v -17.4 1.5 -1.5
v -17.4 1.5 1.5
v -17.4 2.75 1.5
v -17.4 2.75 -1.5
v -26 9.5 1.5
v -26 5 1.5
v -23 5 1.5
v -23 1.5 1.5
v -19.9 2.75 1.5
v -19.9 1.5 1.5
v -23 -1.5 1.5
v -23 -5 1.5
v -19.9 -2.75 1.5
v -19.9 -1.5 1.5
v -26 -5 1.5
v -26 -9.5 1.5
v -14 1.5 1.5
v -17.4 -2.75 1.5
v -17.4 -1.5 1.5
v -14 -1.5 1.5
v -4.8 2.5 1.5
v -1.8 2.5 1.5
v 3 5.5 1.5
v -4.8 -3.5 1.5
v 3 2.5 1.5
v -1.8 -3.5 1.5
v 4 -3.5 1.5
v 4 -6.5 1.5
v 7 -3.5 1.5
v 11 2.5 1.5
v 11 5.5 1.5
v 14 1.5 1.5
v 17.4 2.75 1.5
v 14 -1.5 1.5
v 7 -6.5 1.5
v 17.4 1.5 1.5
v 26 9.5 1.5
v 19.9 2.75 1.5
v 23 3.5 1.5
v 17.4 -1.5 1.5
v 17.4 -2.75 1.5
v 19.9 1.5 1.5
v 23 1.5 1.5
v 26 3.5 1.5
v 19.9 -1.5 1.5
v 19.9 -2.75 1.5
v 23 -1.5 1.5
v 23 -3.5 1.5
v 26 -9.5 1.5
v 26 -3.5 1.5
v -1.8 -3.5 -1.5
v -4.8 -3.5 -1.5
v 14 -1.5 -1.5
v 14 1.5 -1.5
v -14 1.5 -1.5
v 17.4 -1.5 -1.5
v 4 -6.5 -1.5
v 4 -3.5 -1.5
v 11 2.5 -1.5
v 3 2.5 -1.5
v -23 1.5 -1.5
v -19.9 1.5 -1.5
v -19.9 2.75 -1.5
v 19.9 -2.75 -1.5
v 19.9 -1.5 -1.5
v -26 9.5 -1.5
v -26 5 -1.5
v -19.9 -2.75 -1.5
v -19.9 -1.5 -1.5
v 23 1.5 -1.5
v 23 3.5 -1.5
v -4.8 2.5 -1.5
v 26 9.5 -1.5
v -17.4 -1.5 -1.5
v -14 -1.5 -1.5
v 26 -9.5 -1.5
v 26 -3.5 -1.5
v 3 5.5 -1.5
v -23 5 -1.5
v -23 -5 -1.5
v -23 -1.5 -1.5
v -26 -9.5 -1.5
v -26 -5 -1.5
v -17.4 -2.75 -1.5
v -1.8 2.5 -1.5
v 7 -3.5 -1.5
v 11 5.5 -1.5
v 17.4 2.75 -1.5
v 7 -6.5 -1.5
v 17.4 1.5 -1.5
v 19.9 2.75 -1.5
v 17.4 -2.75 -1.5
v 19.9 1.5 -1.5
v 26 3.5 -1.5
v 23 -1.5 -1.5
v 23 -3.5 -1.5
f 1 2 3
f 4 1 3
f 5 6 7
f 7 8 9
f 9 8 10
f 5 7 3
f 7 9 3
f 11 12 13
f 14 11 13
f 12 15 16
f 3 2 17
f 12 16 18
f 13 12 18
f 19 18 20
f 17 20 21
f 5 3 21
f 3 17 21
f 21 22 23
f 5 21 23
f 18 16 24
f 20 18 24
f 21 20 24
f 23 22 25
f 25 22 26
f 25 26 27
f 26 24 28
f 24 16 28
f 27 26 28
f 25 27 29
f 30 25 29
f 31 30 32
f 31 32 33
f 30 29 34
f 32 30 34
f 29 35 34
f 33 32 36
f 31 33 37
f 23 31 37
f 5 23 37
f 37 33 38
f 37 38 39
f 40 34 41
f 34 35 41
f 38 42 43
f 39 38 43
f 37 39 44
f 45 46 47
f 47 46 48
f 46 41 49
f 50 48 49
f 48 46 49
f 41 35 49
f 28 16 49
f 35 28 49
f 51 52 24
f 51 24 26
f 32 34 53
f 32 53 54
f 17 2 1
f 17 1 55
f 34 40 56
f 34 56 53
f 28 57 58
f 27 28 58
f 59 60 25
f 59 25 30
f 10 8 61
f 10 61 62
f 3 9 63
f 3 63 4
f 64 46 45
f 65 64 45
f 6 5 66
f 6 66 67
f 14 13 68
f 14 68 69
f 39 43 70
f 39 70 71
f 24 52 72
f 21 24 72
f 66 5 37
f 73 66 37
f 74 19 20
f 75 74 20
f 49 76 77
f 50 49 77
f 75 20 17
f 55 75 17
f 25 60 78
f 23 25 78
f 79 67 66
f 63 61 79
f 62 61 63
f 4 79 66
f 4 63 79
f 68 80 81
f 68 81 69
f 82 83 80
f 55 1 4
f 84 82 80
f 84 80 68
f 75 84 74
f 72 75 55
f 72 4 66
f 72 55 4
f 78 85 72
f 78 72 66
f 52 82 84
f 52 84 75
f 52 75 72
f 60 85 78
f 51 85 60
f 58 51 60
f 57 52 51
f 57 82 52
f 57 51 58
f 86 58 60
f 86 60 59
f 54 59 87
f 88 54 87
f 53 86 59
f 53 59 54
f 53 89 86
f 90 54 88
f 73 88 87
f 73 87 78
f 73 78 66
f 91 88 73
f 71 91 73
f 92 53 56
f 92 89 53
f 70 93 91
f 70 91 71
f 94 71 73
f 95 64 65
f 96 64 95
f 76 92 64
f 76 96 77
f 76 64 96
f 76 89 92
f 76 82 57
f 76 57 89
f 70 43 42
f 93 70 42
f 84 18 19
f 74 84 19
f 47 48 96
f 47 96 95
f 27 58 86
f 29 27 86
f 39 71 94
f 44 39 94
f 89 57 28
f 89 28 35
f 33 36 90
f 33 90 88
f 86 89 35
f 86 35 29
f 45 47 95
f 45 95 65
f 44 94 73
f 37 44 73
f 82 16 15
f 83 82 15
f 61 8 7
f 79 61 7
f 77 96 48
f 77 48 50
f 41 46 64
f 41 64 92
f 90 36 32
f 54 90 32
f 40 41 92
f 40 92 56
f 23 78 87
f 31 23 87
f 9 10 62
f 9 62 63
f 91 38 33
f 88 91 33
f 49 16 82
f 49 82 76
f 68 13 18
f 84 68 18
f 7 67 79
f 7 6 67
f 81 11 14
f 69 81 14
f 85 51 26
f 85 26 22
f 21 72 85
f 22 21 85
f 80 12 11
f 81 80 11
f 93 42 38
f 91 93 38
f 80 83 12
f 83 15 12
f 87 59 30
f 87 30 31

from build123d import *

# Parameters (mm, degrees)
ESBO_O1_W                     = 46
ESBO_O1_H                     = 19
RESSALTO_EXTRUS_O1_DEPTH      = 1.5
CORTE_EXTRUS_O3_DEPTH         = 25.929901725
CORTE_EXTRUS_O3_DEPTH_BACK    = 25.929901725
ESBO_O6_W                     = 3
ESBO_O6_H                     = 6
CORTE_EXTRUS_O2_DEPTH         = 25.929901725
CORTE_EXTRUS_O2_DEPTH_BACK    = 25.929901725
DENTE_W                       = 3
DENTE_H                       = 3
RESSALTO_EXTRUS_O3_DEPTH      = 1.5
RESSALTO_EXTRUS_O3_DEPTH_BACK = 1.5
ESBO_O4_W                     = 3
ESBO_O4_H                     = 6
ESBO_O21_W                    = 9
ESBO_O21_H                    = 3
ESBO_O21_W_2                  = 2.5
ESBO_O21_H_2                  = 5.5
CORTE_EXTRUS_O11_DEPTH        = 3
ESBO_O3_W                     = 3
ESBO_O3_H                     = 4.5
RESSALTO_EXTRUS_O2_DEPTH      = 1.5
CORTE_EXTRUS_O12_DEPTH        = 28.721832551
CORTE_EXTRUS_O12_DEPTH_BACK   = 28.721832551
ESBO_O23_W                    = 8
ESBO_O23_H                    = 3


with BuildPart() as part:
    # Esboço1 → Ressalto-extrusão1 (new, symmetric)
    with BuildSketch(Plane.XY):
        Rectangle(ESBO_O1_W, ESBO_O1_H)
    extrude(amount=RESSALTO_EXTRUS_O1_DEPTH, both=True)

    # Esboço6 → Corte-extrusão3 (cut, two sides: drawn at the far end of the back side and taken through both)
    with BuildSketch(Plane.XY.offset(-CORTE_EXTRUS_O3_DEPTH_BACK)):
        with Locations((-3.3, -0.5)):
            Rectangle(ESBO_O6_W, ESBO_O6_H)
    extrude(amount=CORTE_EXTRUS_O3_DEPTH + CORTE_EXTRUS_O3_DEPTH_BACK, mode=Mode.SUBTRACT)

    # Dente → Corte-extrusão2 (cut, two sides: drawn at the far end of the back side and taken through both)
    with BuildSketch(Plane.XY.offset(-CORTE_EXTRUS_O2_DEPTH_BACK)):
        with Locations((5.5, -5)):
            Rectangle(DENTE_W, DENTE_H)
    extrude(amount=CORTE_EXTRUS_O2_DEPTH + CORTE_EXTRUS_O2_DEPTH_BACK, mode=Mode.SUBTRACT)

    # Esboço4 → Ressalto-extrusão3 (add, two sides: drawn at the far end of the back side and taken through both)
    with BuildSketch(Plane.XY.offset(-RESSALTO_EXTRUS_O3_DEPTH_BACK)):
        with Locations((24.5, 6.5)):
            Rectangle(ESBO_O4_W, ESBO_O4_H)
        with Locations((24.5, -6.5)):
            Rectangle(ESBO_O4_W, ESBO_O4_H)
    extrude(amount=RESSALTO_EXTRUS_O3_DEPTH + RESSALTO_EXTRUS_O3_DEPTH_BACK)

    # Esboço21 → Corte-extrusão11 (cut)
    with BuildSketch(Plane(origin=(2.822956614, -2.284701659, 1.5), x_dir=(1, 0, 0), z_dir=(0, 0, 1))):
        with Locations((-21.322956614, 2.284701659)):
            Rectangle(ESBO_O21_W, ESBO_O21_H)
        with Locations((-21.472956614, 2.284701659)):
            Rectangle(ESBO_O21_W_2, ESBO_O21_H_2)
    corte_extrus_o11 = extrude(amount=-CORTE_EXTRUS_O11_DEPTH, mode=Mode.SUBTRACT)

    # Espelhar3: Corte-extrusão11 across plane
    add(corte_extrus_o11.mirror(Plane(origin=(0, 0, 0), x_dir=(0, 0, 1), z_dir=(1, 0, 0))), mode=Mode.SUBTRACT)

    # Esboço3 → Ressalto-extrusão2 (add, symmetric)
    with BuildSketch(Plane.XY):
        with Locations((-24.5, -7.25)):
            Rectangle(ESBO_O3_W, ESBO_O3_H)
    ressalto_extrus_o2 = extrude(amount=RESSALTO_EXTRUS_O2_DEPTH, both=True)

    # Espelhar2: Corte-extrusão11, Ressalto-extrusão2 across plane
    add(corte_extrus_o11.mirror(Plane.ZX), mode=Mode.SUBTRACT)
    add(ressalto_extrus_o2.mirror(Plane.ZX))

    # Esboço23 → Corte-extrusão12 (cut, two sides: drawn at the far end of the back side and taken through both)
    with BuildSketch(Plane.XY.offset(-CORTE_EXTRUS_O12_DEPTH_BACK)):
        with Locations((7, 4)):
            Rectangle(ESBO_O23_W, ESBO_O23_H)
    extrude(amount=CORTE_EXTRUS_O12_DEPTH + CORTE_EXTRUS_O12_DEPTH_BACK, mode=Mode.SUBTRACT)


solid = part.part
